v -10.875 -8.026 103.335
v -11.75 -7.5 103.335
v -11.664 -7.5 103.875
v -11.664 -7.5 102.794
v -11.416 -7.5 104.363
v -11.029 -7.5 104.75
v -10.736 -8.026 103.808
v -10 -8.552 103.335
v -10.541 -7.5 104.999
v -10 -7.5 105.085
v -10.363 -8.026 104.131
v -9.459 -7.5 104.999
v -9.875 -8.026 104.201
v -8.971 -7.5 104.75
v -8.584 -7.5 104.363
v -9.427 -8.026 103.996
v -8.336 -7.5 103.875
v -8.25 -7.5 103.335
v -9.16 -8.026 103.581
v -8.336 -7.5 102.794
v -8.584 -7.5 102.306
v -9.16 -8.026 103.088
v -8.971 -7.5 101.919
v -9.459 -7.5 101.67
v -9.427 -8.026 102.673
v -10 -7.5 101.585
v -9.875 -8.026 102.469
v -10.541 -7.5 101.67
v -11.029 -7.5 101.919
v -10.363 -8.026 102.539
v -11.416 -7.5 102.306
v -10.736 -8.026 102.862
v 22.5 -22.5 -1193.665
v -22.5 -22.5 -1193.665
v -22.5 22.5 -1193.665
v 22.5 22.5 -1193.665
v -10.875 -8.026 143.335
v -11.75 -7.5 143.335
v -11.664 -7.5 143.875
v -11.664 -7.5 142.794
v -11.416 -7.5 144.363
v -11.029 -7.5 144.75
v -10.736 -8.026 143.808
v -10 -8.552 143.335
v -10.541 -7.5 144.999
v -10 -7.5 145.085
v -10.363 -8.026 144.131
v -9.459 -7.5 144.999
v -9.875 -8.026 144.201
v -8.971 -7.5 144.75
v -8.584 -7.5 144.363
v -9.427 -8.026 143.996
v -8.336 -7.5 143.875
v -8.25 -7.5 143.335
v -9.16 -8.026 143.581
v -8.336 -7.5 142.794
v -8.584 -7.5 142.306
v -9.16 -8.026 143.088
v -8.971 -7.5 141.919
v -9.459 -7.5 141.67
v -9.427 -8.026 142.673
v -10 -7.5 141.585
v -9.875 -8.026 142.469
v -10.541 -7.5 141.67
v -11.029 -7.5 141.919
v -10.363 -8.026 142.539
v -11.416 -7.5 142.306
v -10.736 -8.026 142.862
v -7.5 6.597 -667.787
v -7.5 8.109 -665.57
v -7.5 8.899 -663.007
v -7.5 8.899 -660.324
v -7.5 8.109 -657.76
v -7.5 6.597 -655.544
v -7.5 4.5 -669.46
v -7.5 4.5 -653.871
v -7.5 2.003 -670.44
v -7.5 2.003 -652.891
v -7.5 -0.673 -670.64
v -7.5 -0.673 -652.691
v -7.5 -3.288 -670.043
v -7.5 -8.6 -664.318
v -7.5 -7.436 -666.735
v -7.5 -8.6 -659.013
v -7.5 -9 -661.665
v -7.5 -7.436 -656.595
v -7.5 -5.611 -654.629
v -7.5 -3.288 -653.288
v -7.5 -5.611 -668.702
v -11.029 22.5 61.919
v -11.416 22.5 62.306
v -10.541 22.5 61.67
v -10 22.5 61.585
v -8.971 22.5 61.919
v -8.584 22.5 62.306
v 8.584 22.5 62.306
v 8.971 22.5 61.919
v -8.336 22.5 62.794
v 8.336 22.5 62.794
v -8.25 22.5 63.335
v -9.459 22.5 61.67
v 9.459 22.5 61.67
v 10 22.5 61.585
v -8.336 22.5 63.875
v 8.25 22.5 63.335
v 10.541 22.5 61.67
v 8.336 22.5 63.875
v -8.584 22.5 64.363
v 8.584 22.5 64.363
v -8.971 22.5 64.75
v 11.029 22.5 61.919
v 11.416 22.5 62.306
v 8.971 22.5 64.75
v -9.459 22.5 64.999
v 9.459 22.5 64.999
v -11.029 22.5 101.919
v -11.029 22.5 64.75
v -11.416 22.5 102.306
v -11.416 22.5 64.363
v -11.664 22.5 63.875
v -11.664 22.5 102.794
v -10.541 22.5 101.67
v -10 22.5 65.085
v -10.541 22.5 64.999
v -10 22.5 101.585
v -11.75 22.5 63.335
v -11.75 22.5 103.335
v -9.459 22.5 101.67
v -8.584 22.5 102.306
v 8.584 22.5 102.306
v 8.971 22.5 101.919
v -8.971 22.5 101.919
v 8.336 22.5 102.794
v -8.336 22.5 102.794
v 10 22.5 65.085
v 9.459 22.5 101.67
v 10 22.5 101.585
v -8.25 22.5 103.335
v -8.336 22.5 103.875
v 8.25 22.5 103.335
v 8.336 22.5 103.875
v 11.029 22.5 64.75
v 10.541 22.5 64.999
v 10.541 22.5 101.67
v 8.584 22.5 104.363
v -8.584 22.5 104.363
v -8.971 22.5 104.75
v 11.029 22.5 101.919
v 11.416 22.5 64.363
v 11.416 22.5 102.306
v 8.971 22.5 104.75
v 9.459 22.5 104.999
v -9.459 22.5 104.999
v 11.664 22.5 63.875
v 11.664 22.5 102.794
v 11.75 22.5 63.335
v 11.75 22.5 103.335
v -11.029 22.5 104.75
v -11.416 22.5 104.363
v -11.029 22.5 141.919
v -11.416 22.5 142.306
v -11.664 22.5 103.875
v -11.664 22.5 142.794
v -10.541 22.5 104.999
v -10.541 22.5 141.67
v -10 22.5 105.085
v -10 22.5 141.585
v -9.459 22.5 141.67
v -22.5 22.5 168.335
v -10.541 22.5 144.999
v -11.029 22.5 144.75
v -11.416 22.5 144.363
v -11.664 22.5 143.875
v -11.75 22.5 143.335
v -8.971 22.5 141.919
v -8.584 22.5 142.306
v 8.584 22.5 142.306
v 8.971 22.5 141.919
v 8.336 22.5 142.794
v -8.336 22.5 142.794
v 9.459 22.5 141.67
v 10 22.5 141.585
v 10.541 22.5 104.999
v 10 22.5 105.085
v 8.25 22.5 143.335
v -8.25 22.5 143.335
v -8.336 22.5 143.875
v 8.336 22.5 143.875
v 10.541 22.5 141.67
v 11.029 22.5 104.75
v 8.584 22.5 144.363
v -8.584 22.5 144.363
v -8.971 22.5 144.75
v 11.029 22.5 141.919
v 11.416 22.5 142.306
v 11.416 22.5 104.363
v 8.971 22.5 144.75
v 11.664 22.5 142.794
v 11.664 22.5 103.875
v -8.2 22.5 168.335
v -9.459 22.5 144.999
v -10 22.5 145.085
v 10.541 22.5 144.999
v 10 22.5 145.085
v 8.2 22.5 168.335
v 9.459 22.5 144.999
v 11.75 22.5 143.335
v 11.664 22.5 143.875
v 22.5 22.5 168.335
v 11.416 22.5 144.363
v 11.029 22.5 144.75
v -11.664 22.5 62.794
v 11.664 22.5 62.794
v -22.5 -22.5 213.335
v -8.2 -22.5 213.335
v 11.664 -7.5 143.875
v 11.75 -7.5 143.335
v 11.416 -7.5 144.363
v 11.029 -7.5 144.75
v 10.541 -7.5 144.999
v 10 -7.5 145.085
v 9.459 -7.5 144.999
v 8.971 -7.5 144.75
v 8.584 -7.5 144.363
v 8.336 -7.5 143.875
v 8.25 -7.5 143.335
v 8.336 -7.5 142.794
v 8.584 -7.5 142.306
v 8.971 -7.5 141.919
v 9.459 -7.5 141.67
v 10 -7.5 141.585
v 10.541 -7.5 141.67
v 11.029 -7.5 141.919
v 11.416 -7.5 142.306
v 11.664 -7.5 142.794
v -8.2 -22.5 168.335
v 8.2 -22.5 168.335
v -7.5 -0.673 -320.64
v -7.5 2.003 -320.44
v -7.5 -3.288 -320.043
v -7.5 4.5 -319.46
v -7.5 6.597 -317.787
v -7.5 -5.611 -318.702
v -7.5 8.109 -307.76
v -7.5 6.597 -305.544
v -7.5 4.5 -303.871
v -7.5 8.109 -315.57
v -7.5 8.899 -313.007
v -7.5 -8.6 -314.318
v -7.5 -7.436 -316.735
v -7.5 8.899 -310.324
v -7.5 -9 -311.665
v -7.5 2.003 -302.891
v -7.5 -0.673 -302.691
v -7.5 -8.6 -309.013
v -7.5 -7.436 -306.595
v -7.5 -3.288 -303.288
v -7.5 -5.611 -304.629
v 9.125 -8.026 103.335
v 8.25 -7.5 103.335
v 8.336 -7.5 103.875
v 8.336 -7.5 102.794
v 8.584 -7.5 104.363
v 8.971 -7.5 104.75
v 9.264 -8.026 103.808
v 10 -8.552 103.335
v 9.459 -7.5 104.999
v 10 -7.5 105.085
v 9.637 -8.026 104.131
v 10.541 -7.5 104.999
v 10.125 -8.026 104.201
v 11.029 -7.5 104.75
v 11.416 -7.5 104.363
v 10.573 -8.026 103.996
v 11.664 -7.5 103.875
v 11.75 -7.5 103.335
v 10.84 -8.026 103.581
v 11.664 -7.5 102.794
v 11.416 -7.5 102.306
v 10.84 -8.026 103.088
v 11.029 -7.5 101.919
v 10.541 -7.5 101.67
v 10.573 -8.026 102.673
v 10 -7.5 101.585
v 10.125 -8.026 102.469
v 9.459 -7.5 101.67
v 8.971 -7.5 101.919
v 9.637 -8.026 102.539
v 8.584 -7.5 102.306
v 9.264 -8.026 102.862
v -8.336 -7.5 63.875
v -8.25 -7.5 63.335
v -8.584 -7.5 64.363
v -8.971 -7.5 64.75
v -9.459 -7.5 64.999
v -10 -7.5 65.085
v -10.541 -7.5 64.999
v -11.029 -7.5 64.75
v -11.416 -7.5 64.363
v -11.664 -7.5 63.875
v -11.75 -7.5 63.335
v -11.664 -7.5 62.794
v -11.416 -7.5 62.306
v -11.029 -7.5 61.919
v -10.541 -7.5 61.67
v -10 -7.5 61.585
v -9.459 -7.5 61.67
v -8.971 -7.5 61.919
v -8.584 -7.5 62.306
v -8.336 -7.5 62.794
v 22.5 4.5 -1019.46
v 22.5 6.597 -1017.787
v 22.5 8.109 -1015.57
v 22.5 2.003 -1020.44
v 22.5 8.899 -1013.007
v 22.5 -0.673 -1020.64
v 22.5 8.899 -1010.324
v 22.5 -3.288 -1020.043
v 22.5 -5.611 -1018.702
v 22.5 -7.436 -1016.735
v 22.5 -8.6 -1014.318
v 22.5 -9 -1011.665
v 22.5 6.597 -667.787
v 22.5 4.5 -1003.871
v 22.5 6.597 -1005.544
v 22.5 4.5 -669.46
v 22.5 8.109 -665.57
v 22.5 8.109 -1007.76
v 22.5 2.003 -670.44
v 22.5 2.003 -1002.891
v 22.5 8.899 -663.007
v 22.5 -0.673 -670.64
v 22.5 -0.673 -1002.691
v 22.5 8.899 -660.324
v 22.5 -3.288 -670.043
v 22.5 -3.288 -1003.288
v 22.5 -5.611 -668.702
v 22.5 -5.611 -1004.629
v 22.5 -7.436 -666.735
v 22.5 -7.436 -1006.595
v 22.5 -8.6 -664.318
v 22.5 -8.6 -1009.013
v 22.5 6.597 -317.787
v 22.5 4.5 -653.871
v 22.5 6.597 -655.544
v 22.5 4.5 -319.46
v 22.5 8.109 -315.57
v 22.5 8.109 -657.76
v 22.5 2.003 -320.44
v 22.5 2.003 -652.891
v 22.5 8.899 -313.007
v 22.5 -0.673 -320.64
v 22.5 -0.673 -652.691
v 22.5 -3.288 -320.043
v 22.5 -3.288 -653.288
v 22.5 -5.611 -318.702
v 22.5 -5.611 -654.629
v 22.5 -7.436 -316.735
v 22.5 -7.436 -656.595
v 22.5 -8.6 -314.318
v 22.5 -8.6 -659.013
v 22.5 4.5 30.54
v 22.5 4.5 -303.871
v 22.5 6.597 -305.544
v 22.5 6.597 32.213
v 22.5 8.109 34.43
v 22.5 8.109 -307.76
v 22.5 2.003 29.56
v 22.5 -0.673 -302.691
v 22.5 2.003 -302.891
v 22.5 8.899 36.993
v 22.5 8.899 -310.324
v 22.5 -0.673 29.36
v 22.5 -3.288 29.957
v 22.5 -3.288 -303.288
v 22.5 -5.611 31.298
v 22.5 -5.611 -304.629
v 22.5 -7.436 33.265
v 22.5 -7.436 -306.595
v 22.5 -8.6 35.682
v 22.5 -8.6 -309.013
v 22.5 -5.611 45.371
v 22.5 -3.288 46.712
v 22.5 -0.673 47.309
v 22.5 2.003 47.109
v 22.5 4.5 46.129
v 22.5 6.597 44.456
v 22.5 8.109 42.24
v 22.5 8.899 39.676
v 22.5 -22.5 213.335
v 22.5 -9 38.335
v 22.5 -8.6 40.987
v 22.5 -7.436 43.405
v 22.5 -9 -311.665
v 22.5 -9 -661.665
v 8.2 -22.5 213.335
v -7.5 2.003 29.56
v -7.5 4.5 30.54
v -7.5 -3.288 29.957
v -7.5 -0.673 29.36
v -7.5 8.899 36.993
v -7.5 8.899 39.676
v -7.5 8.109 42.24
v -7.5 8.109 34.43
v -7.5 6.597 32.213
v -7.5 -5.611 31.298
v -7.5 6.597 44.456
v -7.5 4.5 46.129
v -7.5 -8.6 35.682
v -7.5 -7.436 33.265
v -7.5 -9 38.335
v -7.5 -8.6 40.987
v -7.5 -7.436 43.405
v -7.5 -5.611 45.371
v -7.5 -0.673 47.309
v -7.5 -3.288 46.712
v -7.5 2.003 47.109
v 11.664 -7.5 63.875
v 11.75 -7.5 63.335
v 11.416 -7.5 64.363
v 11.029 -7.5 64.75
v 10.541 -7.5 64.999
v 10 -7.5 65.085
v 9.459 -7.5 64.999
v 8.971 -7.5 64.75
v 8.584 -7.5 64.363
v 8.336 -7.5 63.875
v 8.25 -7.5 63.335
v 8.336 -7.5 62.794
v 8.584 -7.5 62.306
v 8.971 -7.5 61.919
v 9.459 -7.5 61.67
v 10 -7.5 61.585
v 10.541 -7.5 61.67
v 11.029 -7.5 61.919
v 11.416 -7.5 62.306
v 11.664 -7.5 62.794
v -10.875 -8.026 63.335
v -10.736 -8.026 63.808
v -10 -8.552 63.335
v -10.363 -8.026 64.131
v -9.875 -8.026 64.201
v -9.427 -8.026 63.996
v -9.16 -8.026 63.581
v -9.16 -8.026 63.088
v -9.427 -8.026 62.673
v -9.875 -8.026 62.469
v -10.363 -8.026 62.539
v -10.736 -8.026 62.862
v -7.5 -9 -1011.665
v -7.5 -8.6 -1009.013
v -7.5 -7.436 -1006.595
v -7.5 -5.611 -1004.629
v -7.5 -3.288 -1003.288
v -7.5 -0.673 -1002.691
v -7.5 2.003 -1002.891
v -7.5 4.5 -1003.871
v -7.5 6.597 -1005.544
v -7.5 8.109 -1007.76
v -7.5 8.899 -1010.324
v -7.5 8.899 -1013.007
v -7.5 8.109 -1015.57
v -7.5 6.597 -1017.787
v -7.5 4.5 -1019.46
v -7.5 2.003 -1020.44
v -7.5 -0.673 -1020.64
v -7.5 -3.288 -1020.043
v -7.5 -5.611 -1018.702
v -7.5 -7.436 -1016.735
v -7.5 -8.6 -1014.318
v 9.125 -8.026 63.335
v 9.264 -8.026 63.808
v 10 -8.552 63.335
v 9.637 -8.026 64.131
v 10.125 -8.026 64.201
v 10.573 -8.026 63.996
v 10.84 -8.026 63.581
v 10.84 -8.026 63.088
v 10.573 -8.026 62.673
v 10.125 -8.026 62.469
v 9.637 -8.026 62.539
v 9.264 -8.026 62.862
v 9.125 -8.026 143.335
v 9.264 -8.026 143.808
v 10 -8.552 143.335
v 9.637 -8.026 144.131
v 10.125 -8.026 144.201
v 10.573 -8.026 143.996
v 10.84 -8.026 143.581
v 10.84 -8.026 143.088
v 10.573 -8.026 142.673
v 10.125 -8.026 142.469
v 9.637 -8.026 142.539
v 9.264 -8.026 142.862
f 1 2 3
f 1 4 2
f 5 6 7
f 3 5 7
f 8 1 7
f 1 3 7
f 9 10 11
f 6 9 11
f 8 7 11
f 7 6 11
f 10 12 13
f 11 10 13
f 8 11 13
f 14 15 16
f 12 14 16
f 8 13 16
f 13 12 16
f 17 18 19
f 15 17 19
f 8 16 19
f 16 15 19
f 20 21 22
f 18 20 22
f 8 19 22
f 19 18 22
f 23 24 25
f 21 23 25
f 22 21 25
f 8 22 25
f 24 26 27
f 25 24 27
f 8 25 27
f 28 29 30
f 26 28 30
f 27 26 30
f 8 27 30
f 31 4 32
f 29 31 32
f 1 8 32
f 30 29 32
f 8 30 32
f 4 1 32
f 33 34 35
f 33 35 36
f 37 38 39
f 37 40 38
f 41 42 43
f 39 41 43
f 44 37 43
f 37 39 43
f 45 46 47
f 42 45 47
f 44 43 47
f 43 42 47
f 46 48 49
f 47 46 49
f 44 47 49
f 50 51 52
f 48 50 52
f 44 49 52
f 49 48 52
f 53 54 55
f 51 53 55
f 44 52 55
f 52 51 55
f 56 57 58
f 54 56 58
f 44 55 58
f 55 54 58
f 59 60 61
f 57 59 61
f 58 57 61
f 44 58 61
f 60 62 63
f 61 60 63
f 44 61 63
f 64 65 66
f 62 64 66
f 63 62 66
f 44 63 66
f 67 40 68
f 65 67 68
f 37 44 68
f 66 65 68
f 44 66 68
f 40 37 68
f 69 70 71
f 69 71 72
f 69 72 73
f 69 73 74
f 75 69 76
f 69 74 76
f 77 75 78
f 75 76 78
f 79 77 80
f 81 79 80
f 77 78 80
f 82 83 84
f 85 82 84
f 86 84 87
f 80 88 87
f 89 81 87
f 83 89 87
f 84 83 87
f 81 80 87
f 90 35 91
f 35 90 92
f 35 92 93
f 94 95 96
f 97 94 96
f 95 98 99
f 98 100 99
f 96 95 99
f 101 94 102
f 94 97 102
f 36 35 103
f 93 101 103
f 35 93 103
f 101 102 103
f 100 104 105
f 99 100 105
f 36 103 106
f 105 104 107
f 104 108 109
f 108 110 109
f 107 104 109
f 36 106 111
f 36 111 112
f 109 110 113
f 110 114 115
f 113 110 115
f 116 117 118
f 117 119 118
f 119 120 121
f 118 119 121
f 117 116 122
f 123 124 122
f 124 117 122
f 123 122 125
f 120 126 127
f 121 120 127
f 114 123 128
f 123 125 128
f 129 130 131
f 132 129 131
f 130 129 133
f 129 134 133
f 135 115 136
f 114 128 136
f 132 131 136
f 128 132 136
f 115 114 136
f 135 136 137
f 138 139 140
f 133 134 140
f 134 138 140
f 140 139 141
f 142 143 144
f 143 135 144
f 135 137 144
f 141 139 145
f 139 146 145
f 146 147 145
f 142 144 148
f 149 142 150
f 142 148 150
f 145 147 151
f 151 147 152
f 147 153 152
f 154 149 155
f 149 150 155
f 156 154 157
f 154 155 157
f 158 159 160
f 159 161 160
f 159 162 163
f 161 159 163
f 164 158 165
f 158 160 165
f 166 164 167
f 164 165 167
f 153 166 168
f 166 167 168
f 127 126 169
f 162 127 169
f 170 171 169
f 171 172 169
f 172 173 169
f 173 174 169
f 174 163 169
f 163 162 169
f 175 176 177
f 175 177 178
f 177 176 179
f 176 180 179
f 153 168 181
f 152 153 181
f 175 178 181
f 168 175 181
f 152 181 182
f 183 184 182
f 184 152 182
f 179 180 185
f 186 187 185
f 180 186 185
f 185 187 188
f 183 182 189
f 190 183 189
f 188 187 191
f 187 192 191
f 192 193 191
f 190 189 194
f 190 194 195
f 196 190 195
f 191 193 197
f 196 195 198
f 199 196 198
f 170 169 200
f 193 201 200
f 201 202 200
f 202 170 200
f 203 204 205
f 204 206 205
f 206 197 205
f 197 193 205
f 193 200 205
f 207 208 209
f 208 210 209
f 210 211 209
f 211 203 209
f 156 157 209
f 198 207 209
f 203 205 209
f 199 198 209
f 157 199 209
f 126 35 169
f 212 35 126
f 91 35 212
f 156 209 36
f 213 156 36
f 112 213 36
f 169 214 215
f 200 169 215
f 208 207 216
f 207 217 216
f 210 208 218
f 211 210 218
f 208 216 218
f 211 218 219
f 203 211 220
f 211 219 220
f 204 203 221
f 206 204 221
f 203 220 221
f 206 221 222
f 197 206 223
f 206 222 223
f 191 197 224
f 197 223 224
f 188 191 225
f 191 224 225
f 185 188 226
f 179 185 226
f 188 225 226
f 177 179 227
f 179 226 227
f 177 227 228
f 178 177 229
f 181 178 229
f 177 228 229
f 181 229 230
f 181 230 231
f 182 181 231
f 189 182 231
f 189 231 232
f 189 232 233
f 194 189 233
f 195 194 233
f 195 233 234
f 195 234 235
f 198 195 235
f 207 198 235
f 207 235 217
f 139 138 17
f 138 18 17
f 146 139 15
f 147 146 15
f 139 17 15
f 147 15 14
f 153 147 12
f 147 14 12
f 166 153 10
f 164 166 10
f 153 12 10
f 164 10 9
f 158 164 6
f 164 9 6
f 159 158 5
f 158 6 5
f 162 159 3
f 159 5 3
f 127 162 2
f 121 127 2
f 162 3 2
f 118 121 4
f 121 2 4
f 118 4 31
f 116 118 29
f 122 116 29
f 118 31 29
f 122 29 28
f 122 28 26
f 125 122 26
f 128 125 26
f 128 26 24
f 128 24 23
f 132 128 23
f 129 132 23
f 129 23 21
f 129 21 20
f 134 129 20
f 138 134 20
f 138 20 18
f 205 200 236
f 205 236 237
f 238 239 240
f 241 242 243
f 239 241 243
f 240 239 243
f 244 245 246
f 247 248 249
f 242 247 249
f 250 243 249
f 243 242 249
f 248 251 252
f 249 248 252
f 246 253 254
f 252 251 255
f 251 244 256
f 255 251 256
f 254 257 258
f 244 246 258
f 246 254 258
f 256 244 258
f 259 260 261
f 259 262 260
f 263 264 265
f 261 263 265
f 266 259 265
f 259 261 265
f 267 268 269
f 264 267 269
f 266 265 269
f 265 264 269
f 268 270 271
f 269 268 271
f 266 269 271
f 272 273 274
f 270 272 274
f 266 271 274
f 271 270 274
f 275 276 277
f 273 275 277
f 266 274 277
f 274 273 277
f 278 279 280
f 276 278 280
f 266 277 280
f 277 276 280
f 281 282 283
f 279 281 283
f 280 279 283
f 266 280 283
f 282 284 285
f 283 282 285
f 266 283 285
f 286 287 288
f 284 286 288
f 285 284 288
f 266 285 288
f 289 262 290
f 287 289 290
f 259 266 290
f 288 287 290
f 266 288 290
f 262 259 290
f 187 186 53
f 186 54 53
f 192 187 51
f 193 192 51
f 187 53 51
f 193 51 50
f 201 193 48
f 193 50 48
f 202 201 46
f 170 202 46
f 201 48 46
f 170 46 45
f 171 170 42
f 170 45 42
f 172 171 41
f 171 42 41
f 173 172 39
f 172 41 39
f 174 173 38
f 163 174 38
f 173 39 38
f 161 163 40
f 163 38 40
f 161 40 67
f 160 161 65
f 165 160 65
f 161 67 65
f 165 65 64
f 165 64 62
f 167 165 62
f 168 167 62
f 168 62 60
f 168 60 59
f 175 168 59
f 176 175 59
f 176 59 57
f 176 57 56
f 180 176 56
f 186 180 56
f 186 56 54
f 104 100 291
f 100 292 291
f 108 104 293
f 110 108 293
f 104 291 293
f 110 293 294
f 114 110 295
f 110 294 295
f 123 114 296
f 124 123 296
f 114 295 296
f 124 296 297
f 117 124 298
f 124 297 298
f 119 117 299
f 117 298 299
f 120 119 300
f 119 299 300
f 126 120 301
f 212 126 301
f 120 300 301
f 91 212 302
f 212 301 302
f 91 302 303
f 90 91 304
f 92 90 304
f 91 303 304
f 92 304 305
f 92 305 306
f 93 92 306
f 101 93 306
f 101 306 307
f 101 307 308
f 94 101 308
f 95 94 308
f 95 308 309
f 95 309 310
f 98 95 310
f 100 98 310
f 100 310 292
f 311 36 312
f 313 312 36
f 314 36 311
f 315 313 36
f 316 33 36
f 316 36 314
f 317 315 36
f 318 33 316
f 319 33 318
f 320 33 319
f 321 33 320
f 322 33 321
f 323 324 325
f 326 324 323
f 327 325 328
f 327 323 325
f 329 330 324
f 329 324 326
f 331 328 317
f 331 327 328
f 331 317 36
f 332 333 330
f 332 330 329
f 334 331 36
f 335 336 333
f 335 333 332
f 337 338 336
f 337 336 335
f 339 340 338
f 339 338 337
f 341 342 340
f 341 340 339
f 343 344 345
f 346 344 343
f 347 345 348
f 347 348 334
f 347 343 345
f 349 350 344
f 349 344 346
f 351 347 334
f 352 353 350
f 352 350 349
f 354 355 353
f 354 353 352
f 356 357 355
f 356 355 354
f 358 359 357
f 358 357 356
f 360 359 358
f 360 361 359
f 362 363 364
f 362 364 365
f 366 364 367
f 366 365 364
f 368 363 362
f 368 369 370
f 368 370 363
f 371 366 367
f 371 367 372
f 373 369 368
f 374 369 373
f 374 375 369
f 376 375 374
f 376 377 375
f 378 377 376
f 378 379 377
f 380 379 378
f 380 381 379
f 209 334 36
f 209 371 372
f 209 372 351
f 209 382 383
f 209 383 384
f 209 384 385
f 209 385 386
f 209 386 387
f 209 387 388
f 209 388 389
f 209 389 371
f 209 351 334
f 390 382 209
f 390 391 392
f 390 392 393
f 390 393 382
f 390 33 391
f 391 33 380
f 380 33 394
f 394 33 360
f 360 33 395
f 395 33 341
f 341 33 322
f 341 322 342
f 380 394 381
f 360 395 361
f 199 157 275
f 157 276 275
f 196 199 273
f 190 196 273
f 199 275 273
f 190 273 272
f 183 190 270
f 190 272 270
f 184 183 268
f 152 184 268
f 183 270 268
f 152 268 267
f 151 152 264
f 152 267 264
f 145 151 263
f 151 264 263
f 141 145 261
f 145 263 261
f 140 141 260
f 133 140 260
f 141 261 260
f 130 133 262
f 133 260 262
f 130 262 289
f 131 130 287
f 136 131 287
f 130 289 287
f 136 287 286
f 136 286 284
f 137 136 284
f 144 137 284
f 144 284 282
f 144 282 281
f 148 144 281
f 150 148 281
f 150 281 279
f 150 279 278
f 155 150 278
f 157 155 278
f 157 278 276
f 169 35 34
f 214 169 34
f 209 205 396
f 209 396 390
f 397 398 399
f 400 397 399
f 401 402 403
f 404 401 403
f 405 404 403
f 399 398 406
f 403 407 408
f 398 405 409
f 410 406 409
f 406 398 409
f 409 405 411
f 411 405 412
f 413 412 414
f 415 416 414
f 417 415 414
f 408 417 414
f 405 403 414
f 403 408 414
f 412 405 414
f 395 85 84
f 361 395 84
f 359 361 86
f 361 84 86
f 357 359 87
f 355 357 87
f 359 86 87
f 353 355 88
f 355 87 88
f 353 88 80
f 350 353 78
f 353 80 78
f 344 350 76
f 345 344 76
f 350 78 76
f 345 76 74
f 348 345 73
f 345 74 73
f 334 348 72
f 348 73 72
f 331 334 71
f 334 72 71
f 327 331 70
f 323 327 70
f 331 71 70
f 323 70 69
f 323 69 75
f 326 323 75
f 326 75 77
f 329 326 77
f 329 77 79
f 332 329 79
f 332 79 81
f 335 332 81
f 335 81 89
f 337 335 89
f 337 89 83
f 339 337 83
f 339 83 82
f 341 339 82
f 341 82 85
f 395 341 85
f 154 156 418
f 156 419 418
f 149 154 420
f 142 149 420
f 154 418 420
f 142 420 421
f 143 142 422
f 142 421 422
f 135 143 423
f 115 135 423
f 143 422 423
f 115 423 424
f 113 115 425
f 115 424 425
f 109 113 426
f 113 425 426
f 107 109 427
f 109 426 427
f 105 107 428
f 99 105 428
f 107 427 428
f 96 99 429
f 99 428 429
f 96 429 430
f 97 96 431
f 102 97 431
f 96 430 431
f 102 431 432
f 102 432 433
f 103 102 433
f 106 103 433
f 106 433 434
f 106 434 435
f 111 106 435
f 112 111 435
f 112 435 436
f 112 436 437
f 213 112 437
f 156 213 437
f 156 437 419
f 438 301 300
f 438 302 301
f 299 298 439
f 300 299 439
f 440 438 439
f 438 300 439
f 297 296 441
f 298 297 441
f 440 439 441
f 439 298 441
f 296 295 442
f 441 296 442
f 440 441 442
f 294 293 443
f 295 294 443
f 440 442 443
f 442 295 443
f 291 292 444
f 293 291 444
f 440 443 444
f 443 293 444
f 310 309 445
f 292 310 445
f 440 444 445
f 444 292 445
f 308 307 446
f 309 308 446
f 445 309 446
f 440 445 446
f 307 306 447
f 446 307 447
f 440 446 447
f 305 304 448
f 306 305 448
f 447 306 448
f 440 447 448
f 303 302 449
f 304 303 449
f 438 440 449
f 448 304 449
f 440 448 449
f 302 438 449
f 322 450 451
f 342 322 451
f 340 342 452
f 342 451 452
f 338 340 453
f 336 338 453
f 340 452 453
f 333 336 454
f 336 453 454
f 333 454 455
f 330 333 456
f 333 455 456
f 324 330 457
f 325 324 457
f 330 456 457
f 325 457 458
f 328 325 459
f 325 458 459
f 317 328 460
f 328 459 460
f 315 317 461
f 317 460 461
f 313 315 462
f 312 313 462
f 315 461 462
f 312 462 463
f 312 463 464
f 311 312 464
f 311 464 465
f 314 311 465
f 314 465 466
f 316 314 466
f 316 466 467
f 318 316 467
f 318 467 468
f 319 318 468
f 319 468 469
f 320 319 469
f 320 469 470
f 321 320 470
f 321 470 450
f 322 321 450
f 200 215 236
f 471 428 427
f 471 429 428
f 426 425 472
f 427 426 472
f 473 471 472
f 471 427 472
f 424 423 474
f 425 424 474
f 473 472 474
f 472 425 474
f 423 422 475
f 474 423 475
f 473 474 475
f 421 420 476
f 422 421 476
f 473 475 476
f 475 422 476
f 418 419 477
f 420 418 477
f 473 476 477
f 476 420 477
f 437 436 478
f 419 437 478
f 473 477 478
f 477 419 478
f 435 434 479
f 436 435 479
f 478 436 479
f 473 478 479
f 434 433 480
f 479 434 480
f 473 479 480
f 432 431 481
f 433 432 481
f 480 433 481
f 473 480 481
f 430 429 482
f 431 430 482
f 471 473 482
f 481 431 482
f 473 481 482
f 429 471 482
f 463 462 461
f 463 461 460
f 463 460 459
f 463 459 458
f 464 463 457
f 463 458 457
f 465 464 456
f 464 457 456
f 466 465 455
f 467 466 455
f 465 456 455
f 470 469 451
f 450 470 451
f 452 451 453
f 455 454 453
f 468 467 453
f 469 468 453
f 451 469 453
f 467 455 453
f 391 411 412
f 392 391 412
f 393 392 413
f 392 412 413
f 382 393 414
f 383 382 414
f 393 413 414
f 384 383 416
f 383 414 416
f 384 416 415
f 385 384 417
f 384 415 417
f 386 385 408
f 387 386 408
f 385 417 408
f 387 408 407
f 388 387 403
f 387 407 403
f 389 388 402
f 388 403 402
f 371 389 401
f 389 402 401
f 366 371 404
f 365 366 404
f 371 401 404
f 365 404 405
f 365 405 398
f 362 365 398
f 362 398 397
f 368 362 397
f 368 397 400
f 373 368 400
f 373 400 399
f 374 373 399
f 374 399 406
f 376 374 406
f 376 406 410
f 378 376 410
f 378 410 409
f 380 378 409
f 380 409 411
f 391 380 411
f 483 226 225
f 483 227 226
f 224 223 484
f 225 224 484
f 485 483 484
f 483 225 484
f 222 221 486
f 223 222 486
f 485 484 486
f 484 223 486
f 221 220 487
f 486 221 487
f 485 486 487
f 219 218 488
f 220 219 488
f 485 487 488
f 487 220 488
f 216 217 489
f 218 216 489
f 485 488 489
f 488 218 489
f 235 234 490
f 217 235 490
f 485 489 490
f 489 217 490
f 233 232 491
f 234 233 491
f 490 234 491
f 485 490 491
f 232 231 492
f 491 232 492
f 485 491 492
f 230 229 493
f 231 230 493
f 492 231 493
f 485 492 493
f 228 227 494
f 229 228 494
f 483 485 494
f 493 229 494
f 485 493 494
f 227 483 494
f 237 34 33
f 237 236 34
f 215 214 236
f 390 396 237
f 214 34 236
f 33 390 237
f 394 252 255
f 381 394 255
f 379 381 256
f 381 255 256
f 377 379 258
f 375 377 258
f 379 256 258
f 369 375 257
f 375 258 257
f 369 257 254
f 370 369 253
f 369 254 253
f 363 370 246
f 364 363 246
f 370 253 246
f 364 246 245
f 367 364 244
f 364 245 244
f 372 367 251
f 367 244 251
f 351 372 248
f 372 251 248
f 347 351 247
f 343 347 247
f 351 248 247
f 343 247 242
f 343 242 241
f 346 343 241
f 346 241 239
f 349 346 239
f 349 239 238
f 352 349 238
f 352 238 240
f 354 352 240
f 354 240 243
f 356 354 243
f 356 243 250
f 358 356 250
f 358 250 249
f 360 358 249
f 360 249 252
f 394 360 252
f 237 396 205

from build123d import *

# Parameters (mm, degrees)
F0_W     = 45
F0_H     = 1407
F1_DEPTH = 22.5
F3_SIZE2 = 44.99999
F3_SIZE  = 44.99999
F2_W     = 16.4
F2_H     = 45
F4_DEPTH = 45
F5_R     = 9
F6_DEPTH = 45.001
F7_DEPTH = 15
F9_D     = 3.5
F9_DEPTH = 30
F9_TIP   = 1.0515060833


# Not quite as in the source:
# - a fillet or chamfer is up to 0.001 mm smaller than in the source, because OpenCascade refuses the exact size


with BuildPart() as f1:
    # F0 (on Front) → F1 (new body, symmetric)
    with BuildSketch(Plane.XZ):
        with Locations((0, -490.1653682211)):
            Rectangle(F0_W, F0_H)
    extrude(amount=F1_DEPTH, both=True)

    # F3 (size 45 and 45 in the source; OpenCascade refuses exactly that, so slightly less here)
    f3_edges = [f1.edges().sort_by_distance(p)[0] for p in [
        (0, 22.5, 213.334632),
    ]]
    chamfer(f3_edges, length=F3_SIZE, length2=F3_SIZE2)

    # F2 (on face) → F4 (cut)
    with BuildSketch(Plane.XY.offset(213.3346317789)):
        Rectangle(F2_W, F2_H)
    extrude(amount=-F4_DEPTH, mode=Mode.SUBTRACT)

    # F5 (on face) → F6 (cut, through all)
    with BuildSketch(Plane(origin=(-22.5, 0, 0), x_dir=(0, -1, 0), z_dir=(-1, 0, 0))):
        with Locations((0, 38.3346317789)):
            Circle(F5_R)
        with Locations((0, -311.6653682211)):
            Circle(F5_R)
        with Locations((0, -661.6653682211)):
            Circle(F5_R)
        with Locations((0, -1011.6653682211)):
            Circle(F5_R)
    extrude(amount=-F6_DEPTH, mode=Mode.SUBTRACT)

    # F5 (on face) → F7 (join)
    with BuildSketch(Plane(origin=(-22.5, 0, 0), x_dir=(0, -1, 0), z_dir=(-1, 0, 0))):
        with Locations((0, -1011.6653682211)):
            Circle(F5_R)
        with Locations((0, -661.6653682211)):
            Circle(F5_R)
        with Locations((0, -311.6653682211)):
            Circle(F5_R)
        with Locations((0, 38.3346317789)):
            Circle(F5_R)
    extrude(amount=-F7_DEPTH)

    # F9
    with Locations(Plane(origin=(0, 22.5, 0), x_dir=(-1, 0, 0), z_dir=(0, 1, 0))):
        with Locations((10, 143.3346317789), (10, 103.3346317789), (10, 63.3346317789), (-10, 63.3346317789), (-10, 103.3346317789), (-10, 143.3346317789)):
            Hole(F9_D / 2, depth=F9_DEPTH)
            with Locations((0, 0, -(F9_DEPTH + F9_TIP / 2))):  # 118° drill point
                Cone(0, F9_D / 2, F9_TIP, mode=Mode.SUBTRACT)


solid = f1.part
